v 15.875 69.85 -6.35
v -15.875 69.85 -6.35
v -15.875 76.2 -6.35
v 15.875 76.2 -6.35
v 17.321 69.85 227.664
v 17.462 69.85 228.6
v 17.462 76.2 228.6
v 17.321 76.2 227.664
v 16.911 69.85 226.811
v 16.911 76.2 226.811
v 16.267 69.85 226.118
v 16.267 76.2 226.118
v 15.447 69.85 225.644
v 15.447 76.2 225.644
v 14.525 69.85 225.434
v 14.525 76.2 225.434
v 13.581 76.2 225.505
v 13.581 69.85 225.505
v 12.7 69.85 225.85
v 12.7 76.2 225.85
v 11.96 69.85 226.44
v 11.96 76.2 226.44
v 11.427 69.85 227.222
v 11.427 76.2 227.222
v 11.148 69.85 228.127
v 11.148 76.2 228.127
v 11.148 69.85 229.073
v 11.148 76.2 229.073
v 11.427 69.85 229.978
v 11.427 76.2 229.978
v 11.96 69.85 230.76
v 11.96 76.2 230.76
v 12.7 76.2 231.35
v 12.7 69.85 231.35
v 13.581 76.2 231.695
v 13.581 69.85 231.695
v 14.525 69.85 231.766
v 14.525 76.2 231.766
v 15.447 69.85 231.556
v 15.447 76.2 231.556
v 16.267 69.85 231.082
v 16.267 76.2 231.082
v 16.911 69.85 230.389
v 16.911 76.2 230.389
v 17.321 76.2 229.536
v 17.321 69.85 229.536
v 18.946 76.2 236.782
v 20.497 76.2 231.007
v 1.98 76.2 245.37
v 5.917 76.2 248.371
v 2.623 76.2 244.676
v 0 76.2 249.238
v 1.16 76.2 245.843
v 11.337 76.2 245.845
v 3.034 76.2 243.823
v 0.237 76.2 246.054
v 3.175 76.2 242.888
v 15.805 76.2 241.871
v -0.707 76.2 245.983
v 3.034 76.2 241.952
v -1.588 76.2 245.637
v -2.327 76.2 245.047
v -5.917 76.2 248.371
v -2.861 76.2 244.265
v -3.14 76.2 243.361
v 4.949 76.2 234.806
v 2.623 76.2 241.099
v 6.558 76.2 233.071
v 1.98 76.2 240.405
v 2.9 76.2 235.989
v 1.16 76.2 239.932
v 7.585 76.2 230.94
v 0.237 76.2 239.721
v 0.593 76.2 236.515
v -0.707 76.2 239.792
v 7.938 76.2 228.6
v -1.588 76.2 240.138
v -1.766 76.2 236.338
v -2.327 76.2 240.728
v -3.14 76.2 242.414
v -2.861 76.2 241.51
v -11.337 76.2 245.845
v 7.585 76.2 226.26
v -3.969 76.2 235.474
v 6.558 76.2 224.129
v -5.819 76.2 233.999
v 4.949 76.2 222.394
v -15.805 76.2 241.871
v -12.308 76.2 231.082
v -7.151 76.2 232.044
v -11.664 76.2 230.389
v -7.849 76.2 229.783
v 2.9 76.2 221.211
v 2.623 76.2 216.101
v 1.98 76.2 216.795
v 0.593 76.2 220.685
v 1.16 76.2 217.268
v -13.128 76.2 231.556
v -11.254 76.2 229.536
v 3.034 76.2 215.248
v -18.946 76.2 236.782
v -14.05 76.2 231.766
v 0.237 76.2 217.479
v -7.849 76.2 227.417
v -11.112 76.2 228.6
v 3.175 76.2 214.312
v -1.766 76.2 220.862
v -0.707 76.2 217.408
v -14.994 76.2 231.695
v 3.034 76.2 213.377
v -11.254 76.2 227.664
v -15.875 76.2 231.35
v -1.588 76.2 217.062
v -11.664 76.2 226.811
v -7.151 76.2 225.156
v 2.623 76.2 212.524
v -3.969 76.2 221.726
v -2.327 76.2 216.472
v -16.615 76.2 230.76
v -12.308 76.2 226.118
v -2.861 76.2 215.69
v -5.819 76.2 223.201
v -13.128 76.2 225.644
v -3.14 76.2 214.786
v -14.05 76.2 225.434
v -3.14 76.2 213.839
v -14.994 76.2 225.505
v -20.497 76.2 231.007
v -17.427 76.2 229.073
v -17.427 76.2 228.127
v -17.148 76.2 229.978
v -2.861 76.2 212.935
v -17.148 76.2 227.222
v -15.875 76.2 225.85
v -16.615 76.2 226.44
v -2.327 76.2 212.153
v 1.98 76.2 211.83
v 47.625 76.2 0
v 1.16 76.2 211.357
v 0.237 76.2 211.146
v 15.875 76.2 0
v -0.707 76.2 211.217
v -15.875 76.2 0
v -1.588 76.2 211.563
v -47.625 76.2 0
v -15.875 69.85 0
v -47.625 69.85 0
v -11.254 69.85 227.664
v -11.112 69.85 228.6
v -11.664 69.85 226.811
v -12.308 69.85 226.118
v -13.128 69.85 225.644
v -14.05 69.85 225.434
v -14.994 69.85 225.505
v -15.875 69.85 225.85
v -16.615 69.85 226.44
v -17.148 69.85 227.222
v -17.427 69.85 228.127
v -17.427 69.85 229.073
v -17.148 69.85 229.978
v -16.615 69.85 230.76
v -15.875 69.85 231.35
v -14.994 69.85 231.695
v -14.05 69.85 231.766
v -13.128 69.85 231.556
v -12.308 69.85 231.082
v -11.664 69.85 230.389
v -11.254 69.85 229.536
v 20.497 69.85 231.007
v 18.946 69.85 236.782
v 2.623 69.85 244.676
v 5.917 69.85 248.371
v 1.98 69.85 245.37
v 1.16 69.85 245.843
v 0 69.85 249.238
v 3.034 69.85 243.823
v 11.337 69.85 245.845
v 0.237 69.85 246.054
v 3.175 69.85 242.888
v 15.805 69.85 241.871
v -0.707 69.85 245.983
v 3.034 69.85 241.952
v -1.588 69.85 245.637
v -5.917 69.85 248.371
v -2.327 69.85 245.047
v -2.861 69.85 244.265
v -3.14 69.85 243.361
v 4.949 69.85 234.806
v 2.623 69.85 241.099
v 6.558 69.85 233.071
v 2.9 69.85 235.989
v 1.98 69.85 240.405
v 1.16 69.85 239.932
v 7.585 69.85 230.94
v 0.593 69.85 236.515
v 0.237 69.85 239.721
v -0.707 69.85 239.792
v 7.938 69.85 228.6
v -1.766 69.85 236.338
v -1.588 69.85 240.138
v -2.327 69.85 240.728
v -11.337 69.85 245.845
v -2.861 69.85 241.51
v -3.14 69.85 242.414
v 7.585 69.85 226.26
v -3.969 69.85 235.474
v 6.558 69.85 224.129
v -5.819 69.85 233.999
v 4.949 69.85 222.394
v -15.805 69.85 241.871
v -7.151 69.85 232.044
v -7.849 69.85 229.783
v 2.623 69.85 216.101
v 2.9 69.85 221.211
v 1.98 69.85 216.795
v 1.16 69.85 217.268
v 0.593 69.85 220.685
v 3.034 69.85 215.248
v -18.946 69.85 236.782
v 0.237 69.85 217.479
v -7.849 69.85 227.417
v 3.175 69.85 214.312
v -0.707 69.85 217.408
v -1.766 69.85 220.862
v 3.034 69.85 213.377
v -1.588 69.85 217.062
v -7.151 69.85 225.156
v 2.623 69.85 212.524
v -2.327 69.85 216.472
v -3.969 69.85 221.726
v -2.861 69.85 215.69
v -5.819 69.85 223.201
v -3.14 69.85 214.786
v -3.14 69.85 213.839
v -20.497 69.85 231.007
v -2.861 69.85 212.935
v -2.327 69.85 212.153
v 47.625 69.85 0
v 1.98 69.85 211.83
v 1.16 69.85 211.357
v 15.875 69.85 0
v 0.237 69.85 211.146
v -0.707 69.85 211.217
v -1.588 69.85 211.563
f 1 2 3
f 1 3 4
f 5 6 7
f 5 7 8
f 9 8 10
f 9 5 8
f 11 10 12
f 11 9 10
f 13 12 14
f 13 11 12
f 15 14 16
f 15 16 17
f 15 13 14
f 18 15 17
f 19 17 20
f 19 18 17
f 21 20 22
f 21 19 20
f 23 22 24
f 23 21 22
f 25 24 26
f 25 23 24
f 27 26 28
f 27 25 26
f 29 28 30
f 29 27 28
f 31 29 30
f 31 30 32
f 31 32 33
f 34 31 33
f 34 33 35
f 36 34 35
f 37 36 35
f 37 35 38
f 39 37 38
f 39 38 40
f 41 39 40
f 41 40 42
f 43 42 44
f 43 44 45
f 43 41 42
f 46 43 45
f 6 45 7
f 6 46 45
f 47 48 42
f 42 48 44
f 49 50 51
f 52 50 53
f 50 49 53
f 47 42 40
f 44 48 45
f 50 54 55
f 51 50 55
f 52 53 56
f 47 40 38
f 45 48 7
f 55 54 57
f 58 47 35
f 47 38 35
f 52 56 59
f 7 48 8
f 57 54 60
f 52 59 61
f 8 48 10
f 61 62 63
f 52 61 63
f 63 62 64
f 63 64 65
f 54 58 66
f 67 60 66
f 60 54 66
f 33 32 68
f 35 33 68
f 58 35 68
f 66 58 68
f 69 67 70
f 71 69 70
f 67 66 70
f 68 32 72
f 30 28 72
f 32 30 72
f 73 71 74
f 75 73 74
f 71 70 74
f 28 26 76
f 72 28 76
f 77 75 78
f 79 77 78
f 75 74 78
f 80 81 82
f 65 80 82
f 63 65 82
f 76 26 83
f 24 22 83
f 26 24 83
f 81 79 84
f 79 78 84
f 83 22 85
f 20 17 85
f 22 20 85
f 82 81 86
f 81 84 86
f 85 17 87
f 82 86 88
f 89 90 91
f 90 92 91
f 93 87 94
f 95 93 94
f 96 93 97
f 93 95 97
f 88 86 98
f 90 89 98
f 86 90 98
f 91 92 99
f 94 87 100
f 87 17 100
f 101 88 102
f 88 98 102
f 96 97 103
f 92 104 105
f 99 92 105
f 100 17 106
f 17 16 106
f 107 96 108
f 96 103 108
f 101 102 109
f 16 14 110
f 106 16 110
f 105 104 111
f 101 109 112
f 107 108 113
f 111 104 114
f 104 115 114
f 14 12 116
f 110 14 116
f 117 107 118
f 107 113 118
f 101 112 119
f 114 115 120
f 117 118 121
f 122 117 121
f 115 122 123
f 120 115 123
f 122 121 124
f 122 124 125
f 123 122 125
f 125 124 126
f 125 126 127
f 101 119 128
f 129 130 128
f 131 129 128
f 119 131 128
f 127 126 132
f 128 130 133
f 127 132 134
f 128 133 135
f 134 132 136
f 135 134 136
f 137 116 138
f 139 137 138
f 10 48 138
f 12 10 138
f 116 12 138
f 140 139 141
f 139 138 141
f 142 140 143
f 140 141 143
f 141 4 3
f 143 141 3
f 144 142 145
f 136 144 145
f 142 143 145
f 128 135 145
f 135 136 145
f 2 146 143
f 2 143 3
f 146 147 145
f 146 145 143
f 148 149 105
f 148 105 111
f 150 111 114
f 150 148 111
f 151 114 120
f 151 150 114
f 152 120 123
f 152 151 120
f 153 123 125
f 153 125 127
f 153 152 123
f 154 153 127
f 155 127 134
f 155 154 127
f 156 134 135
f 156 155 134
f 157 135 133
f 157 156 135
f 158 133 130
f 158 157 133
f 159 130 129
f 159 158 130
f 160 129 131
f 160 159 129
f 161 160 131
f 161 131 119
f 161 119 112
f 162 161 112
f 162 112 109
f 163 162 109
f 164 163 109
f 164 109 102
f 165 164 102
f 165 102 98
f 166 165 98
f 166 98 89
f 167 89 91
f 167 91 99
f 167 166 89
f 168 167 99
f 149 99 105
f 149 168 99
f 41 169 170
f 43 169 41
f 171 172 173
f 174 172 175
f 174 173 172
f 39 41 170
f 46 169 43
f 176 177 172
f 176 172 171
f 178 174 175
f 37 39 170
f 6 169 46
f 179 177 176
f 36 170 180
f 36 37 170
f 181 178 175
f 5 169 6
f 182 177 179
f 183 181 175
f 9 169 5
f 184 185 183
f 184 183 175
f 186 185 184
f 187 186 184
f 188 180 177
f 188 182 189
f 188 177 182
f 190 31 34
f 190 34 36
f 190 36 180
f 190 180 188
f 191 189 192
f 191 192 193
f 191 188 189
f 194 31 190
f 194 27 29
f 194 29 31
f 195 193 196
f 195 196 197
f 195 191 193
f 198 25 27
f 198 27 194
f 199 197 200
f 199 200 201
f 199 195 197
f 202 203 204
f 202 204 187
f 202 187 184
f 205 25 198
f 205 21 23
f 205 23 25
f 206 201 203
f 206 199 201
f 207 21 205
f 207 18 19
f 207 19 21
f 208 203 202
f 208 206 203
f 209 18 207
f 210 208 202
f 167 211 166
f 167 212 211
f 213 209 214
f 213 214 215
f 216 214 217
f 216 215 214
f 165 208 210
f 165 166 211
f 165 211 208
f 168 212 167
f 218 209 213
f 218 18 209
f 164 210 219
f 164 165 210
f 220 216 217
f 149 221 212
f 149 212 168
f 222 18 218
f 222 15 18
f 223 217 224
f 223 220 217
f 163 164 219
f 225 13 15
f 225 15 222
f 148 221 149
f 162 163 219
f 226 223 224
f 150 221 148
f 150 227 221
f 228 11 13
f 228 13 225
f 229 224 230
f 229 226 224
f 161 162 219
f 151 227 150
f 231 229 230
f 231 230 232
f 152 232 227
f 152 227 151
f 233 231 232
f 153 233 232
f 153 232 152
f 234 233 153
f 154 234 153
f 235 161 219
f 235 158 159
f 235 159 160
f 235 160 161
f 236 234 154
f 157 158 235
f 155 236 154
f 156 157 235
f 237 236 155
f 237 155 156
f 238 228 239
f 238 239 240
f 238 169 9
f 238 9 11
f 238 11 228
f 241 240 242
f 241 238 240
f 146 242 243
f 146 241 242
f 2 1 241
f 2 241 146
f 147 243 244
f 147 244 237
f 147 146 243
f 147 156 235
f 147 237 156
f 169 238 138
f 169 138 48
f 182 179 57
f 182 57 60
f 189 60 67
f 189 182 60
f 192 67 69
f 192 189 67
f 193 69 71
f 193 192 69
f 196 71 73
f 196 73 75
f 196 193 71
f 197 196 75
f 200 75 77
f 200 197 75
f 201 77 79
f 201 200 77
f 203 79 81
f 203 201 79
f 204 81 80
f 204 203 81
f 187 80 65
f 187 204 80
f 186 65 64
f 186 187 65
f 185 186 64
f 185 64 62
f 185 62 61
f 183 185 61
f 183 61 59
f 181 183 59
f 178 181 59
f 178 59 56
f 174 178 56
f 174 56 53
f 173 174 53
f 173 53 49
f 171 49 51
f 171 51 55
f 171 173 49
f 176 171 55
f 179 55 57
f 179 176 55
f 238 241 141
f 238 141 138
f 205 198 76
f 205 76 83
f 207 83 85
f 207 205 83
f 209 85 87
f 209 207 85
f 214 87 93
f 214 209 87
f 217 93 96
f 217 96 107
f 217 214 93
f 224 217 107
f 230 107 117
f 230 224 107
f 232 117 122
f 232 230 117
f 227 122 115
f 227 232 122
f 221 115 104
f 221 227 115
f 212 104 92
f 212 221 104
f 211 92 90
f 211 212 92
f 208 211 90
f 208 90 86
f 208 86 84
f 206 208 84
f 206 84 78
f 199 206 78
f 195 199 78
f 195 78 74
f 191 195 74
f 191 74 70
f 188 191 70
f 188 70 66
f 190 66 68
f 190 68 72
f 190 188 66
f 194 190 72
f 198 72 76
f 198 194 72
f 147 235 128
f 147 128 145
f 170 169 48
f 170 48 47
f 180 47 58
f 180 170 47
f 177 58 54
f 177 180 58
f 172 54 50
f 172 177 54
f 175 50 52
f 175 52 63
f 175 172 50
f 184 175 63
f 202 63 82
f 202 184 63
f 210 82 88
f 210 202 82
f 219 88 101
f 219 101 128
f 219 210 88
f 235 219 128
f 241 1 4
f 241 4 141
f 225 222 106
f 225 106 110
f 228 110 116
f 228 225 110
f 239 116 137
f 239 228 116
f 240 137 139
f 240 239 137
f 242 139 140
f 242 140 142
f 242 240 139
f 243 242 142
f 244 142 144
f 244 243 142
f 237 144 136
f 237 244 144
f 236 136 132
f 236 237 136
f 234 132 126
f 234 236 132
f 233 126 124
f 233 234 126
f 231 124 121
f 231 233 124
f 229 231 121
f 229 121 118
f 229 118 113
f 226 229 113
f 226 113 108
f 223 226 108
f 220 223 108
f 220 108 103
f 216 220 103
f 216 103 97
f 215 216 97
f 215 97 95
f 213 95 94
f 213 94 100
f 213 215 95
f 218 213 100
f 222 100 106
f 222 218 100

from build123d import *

# Parameters (mm, degrees)
SKETCH2_R           = 7.9375
SKETCH2_R_2         = 3.175
BOSS_EXTRUDE1_DEPTH = 6.35


with BuildPart() as part:
    # Sketch2 → Boss-Extrude1 (new body)
    with BuildSketch(Plane(origin=(0, 69.85, 0), x_dir=(1, 0, 0), z_dir=(0, 1, 0))):
        with BuildLine():
            Line((-15.875, 6.35), (15.875, 6.35))
            Line((15.875, 6.35), (15.875, 0))
            Line((15.875, 0), (47.625, 0))
            Line((47.625, 0), (20.496649102, -231.007027591))
            ThreePointArc((20.496649102, -231.007027591), (0, -249.2375), (-20.496649102, -231.007027591))
            Line((-20.496649102, -231.007027591), (-47.625, 0))
            Line((-47.625, 0), (-15.875, 0))
            Line((-15.875, 0), (-15.875, 6.35))
        make_face()
        with Locations((0, -228.6)):
            Circle(SKETCH2_R, mode=Mode.SUBTRACT)
        with Locations((0, -214.3125)):
            Circle(SKETCH2_R_2, mode=Mode.SUBTRACT)
        with Locations((14.2875, -228.6)):
            Circle(SKETCH2_R_2, mode=Mode.SUBTRACT)
        with Locations((0, -242.8875)):
            Circle(SKETCH2_R_2, mode=Mode.SUBTRACT)
        with Locations((-14.2875, -228.6)):
            Circle(SKETCH2_R_2, mode=Mode.SUBTRACT)
    extrude(amount=BOSS_EXTRUDE1_DEPTH)


solid = part.part
